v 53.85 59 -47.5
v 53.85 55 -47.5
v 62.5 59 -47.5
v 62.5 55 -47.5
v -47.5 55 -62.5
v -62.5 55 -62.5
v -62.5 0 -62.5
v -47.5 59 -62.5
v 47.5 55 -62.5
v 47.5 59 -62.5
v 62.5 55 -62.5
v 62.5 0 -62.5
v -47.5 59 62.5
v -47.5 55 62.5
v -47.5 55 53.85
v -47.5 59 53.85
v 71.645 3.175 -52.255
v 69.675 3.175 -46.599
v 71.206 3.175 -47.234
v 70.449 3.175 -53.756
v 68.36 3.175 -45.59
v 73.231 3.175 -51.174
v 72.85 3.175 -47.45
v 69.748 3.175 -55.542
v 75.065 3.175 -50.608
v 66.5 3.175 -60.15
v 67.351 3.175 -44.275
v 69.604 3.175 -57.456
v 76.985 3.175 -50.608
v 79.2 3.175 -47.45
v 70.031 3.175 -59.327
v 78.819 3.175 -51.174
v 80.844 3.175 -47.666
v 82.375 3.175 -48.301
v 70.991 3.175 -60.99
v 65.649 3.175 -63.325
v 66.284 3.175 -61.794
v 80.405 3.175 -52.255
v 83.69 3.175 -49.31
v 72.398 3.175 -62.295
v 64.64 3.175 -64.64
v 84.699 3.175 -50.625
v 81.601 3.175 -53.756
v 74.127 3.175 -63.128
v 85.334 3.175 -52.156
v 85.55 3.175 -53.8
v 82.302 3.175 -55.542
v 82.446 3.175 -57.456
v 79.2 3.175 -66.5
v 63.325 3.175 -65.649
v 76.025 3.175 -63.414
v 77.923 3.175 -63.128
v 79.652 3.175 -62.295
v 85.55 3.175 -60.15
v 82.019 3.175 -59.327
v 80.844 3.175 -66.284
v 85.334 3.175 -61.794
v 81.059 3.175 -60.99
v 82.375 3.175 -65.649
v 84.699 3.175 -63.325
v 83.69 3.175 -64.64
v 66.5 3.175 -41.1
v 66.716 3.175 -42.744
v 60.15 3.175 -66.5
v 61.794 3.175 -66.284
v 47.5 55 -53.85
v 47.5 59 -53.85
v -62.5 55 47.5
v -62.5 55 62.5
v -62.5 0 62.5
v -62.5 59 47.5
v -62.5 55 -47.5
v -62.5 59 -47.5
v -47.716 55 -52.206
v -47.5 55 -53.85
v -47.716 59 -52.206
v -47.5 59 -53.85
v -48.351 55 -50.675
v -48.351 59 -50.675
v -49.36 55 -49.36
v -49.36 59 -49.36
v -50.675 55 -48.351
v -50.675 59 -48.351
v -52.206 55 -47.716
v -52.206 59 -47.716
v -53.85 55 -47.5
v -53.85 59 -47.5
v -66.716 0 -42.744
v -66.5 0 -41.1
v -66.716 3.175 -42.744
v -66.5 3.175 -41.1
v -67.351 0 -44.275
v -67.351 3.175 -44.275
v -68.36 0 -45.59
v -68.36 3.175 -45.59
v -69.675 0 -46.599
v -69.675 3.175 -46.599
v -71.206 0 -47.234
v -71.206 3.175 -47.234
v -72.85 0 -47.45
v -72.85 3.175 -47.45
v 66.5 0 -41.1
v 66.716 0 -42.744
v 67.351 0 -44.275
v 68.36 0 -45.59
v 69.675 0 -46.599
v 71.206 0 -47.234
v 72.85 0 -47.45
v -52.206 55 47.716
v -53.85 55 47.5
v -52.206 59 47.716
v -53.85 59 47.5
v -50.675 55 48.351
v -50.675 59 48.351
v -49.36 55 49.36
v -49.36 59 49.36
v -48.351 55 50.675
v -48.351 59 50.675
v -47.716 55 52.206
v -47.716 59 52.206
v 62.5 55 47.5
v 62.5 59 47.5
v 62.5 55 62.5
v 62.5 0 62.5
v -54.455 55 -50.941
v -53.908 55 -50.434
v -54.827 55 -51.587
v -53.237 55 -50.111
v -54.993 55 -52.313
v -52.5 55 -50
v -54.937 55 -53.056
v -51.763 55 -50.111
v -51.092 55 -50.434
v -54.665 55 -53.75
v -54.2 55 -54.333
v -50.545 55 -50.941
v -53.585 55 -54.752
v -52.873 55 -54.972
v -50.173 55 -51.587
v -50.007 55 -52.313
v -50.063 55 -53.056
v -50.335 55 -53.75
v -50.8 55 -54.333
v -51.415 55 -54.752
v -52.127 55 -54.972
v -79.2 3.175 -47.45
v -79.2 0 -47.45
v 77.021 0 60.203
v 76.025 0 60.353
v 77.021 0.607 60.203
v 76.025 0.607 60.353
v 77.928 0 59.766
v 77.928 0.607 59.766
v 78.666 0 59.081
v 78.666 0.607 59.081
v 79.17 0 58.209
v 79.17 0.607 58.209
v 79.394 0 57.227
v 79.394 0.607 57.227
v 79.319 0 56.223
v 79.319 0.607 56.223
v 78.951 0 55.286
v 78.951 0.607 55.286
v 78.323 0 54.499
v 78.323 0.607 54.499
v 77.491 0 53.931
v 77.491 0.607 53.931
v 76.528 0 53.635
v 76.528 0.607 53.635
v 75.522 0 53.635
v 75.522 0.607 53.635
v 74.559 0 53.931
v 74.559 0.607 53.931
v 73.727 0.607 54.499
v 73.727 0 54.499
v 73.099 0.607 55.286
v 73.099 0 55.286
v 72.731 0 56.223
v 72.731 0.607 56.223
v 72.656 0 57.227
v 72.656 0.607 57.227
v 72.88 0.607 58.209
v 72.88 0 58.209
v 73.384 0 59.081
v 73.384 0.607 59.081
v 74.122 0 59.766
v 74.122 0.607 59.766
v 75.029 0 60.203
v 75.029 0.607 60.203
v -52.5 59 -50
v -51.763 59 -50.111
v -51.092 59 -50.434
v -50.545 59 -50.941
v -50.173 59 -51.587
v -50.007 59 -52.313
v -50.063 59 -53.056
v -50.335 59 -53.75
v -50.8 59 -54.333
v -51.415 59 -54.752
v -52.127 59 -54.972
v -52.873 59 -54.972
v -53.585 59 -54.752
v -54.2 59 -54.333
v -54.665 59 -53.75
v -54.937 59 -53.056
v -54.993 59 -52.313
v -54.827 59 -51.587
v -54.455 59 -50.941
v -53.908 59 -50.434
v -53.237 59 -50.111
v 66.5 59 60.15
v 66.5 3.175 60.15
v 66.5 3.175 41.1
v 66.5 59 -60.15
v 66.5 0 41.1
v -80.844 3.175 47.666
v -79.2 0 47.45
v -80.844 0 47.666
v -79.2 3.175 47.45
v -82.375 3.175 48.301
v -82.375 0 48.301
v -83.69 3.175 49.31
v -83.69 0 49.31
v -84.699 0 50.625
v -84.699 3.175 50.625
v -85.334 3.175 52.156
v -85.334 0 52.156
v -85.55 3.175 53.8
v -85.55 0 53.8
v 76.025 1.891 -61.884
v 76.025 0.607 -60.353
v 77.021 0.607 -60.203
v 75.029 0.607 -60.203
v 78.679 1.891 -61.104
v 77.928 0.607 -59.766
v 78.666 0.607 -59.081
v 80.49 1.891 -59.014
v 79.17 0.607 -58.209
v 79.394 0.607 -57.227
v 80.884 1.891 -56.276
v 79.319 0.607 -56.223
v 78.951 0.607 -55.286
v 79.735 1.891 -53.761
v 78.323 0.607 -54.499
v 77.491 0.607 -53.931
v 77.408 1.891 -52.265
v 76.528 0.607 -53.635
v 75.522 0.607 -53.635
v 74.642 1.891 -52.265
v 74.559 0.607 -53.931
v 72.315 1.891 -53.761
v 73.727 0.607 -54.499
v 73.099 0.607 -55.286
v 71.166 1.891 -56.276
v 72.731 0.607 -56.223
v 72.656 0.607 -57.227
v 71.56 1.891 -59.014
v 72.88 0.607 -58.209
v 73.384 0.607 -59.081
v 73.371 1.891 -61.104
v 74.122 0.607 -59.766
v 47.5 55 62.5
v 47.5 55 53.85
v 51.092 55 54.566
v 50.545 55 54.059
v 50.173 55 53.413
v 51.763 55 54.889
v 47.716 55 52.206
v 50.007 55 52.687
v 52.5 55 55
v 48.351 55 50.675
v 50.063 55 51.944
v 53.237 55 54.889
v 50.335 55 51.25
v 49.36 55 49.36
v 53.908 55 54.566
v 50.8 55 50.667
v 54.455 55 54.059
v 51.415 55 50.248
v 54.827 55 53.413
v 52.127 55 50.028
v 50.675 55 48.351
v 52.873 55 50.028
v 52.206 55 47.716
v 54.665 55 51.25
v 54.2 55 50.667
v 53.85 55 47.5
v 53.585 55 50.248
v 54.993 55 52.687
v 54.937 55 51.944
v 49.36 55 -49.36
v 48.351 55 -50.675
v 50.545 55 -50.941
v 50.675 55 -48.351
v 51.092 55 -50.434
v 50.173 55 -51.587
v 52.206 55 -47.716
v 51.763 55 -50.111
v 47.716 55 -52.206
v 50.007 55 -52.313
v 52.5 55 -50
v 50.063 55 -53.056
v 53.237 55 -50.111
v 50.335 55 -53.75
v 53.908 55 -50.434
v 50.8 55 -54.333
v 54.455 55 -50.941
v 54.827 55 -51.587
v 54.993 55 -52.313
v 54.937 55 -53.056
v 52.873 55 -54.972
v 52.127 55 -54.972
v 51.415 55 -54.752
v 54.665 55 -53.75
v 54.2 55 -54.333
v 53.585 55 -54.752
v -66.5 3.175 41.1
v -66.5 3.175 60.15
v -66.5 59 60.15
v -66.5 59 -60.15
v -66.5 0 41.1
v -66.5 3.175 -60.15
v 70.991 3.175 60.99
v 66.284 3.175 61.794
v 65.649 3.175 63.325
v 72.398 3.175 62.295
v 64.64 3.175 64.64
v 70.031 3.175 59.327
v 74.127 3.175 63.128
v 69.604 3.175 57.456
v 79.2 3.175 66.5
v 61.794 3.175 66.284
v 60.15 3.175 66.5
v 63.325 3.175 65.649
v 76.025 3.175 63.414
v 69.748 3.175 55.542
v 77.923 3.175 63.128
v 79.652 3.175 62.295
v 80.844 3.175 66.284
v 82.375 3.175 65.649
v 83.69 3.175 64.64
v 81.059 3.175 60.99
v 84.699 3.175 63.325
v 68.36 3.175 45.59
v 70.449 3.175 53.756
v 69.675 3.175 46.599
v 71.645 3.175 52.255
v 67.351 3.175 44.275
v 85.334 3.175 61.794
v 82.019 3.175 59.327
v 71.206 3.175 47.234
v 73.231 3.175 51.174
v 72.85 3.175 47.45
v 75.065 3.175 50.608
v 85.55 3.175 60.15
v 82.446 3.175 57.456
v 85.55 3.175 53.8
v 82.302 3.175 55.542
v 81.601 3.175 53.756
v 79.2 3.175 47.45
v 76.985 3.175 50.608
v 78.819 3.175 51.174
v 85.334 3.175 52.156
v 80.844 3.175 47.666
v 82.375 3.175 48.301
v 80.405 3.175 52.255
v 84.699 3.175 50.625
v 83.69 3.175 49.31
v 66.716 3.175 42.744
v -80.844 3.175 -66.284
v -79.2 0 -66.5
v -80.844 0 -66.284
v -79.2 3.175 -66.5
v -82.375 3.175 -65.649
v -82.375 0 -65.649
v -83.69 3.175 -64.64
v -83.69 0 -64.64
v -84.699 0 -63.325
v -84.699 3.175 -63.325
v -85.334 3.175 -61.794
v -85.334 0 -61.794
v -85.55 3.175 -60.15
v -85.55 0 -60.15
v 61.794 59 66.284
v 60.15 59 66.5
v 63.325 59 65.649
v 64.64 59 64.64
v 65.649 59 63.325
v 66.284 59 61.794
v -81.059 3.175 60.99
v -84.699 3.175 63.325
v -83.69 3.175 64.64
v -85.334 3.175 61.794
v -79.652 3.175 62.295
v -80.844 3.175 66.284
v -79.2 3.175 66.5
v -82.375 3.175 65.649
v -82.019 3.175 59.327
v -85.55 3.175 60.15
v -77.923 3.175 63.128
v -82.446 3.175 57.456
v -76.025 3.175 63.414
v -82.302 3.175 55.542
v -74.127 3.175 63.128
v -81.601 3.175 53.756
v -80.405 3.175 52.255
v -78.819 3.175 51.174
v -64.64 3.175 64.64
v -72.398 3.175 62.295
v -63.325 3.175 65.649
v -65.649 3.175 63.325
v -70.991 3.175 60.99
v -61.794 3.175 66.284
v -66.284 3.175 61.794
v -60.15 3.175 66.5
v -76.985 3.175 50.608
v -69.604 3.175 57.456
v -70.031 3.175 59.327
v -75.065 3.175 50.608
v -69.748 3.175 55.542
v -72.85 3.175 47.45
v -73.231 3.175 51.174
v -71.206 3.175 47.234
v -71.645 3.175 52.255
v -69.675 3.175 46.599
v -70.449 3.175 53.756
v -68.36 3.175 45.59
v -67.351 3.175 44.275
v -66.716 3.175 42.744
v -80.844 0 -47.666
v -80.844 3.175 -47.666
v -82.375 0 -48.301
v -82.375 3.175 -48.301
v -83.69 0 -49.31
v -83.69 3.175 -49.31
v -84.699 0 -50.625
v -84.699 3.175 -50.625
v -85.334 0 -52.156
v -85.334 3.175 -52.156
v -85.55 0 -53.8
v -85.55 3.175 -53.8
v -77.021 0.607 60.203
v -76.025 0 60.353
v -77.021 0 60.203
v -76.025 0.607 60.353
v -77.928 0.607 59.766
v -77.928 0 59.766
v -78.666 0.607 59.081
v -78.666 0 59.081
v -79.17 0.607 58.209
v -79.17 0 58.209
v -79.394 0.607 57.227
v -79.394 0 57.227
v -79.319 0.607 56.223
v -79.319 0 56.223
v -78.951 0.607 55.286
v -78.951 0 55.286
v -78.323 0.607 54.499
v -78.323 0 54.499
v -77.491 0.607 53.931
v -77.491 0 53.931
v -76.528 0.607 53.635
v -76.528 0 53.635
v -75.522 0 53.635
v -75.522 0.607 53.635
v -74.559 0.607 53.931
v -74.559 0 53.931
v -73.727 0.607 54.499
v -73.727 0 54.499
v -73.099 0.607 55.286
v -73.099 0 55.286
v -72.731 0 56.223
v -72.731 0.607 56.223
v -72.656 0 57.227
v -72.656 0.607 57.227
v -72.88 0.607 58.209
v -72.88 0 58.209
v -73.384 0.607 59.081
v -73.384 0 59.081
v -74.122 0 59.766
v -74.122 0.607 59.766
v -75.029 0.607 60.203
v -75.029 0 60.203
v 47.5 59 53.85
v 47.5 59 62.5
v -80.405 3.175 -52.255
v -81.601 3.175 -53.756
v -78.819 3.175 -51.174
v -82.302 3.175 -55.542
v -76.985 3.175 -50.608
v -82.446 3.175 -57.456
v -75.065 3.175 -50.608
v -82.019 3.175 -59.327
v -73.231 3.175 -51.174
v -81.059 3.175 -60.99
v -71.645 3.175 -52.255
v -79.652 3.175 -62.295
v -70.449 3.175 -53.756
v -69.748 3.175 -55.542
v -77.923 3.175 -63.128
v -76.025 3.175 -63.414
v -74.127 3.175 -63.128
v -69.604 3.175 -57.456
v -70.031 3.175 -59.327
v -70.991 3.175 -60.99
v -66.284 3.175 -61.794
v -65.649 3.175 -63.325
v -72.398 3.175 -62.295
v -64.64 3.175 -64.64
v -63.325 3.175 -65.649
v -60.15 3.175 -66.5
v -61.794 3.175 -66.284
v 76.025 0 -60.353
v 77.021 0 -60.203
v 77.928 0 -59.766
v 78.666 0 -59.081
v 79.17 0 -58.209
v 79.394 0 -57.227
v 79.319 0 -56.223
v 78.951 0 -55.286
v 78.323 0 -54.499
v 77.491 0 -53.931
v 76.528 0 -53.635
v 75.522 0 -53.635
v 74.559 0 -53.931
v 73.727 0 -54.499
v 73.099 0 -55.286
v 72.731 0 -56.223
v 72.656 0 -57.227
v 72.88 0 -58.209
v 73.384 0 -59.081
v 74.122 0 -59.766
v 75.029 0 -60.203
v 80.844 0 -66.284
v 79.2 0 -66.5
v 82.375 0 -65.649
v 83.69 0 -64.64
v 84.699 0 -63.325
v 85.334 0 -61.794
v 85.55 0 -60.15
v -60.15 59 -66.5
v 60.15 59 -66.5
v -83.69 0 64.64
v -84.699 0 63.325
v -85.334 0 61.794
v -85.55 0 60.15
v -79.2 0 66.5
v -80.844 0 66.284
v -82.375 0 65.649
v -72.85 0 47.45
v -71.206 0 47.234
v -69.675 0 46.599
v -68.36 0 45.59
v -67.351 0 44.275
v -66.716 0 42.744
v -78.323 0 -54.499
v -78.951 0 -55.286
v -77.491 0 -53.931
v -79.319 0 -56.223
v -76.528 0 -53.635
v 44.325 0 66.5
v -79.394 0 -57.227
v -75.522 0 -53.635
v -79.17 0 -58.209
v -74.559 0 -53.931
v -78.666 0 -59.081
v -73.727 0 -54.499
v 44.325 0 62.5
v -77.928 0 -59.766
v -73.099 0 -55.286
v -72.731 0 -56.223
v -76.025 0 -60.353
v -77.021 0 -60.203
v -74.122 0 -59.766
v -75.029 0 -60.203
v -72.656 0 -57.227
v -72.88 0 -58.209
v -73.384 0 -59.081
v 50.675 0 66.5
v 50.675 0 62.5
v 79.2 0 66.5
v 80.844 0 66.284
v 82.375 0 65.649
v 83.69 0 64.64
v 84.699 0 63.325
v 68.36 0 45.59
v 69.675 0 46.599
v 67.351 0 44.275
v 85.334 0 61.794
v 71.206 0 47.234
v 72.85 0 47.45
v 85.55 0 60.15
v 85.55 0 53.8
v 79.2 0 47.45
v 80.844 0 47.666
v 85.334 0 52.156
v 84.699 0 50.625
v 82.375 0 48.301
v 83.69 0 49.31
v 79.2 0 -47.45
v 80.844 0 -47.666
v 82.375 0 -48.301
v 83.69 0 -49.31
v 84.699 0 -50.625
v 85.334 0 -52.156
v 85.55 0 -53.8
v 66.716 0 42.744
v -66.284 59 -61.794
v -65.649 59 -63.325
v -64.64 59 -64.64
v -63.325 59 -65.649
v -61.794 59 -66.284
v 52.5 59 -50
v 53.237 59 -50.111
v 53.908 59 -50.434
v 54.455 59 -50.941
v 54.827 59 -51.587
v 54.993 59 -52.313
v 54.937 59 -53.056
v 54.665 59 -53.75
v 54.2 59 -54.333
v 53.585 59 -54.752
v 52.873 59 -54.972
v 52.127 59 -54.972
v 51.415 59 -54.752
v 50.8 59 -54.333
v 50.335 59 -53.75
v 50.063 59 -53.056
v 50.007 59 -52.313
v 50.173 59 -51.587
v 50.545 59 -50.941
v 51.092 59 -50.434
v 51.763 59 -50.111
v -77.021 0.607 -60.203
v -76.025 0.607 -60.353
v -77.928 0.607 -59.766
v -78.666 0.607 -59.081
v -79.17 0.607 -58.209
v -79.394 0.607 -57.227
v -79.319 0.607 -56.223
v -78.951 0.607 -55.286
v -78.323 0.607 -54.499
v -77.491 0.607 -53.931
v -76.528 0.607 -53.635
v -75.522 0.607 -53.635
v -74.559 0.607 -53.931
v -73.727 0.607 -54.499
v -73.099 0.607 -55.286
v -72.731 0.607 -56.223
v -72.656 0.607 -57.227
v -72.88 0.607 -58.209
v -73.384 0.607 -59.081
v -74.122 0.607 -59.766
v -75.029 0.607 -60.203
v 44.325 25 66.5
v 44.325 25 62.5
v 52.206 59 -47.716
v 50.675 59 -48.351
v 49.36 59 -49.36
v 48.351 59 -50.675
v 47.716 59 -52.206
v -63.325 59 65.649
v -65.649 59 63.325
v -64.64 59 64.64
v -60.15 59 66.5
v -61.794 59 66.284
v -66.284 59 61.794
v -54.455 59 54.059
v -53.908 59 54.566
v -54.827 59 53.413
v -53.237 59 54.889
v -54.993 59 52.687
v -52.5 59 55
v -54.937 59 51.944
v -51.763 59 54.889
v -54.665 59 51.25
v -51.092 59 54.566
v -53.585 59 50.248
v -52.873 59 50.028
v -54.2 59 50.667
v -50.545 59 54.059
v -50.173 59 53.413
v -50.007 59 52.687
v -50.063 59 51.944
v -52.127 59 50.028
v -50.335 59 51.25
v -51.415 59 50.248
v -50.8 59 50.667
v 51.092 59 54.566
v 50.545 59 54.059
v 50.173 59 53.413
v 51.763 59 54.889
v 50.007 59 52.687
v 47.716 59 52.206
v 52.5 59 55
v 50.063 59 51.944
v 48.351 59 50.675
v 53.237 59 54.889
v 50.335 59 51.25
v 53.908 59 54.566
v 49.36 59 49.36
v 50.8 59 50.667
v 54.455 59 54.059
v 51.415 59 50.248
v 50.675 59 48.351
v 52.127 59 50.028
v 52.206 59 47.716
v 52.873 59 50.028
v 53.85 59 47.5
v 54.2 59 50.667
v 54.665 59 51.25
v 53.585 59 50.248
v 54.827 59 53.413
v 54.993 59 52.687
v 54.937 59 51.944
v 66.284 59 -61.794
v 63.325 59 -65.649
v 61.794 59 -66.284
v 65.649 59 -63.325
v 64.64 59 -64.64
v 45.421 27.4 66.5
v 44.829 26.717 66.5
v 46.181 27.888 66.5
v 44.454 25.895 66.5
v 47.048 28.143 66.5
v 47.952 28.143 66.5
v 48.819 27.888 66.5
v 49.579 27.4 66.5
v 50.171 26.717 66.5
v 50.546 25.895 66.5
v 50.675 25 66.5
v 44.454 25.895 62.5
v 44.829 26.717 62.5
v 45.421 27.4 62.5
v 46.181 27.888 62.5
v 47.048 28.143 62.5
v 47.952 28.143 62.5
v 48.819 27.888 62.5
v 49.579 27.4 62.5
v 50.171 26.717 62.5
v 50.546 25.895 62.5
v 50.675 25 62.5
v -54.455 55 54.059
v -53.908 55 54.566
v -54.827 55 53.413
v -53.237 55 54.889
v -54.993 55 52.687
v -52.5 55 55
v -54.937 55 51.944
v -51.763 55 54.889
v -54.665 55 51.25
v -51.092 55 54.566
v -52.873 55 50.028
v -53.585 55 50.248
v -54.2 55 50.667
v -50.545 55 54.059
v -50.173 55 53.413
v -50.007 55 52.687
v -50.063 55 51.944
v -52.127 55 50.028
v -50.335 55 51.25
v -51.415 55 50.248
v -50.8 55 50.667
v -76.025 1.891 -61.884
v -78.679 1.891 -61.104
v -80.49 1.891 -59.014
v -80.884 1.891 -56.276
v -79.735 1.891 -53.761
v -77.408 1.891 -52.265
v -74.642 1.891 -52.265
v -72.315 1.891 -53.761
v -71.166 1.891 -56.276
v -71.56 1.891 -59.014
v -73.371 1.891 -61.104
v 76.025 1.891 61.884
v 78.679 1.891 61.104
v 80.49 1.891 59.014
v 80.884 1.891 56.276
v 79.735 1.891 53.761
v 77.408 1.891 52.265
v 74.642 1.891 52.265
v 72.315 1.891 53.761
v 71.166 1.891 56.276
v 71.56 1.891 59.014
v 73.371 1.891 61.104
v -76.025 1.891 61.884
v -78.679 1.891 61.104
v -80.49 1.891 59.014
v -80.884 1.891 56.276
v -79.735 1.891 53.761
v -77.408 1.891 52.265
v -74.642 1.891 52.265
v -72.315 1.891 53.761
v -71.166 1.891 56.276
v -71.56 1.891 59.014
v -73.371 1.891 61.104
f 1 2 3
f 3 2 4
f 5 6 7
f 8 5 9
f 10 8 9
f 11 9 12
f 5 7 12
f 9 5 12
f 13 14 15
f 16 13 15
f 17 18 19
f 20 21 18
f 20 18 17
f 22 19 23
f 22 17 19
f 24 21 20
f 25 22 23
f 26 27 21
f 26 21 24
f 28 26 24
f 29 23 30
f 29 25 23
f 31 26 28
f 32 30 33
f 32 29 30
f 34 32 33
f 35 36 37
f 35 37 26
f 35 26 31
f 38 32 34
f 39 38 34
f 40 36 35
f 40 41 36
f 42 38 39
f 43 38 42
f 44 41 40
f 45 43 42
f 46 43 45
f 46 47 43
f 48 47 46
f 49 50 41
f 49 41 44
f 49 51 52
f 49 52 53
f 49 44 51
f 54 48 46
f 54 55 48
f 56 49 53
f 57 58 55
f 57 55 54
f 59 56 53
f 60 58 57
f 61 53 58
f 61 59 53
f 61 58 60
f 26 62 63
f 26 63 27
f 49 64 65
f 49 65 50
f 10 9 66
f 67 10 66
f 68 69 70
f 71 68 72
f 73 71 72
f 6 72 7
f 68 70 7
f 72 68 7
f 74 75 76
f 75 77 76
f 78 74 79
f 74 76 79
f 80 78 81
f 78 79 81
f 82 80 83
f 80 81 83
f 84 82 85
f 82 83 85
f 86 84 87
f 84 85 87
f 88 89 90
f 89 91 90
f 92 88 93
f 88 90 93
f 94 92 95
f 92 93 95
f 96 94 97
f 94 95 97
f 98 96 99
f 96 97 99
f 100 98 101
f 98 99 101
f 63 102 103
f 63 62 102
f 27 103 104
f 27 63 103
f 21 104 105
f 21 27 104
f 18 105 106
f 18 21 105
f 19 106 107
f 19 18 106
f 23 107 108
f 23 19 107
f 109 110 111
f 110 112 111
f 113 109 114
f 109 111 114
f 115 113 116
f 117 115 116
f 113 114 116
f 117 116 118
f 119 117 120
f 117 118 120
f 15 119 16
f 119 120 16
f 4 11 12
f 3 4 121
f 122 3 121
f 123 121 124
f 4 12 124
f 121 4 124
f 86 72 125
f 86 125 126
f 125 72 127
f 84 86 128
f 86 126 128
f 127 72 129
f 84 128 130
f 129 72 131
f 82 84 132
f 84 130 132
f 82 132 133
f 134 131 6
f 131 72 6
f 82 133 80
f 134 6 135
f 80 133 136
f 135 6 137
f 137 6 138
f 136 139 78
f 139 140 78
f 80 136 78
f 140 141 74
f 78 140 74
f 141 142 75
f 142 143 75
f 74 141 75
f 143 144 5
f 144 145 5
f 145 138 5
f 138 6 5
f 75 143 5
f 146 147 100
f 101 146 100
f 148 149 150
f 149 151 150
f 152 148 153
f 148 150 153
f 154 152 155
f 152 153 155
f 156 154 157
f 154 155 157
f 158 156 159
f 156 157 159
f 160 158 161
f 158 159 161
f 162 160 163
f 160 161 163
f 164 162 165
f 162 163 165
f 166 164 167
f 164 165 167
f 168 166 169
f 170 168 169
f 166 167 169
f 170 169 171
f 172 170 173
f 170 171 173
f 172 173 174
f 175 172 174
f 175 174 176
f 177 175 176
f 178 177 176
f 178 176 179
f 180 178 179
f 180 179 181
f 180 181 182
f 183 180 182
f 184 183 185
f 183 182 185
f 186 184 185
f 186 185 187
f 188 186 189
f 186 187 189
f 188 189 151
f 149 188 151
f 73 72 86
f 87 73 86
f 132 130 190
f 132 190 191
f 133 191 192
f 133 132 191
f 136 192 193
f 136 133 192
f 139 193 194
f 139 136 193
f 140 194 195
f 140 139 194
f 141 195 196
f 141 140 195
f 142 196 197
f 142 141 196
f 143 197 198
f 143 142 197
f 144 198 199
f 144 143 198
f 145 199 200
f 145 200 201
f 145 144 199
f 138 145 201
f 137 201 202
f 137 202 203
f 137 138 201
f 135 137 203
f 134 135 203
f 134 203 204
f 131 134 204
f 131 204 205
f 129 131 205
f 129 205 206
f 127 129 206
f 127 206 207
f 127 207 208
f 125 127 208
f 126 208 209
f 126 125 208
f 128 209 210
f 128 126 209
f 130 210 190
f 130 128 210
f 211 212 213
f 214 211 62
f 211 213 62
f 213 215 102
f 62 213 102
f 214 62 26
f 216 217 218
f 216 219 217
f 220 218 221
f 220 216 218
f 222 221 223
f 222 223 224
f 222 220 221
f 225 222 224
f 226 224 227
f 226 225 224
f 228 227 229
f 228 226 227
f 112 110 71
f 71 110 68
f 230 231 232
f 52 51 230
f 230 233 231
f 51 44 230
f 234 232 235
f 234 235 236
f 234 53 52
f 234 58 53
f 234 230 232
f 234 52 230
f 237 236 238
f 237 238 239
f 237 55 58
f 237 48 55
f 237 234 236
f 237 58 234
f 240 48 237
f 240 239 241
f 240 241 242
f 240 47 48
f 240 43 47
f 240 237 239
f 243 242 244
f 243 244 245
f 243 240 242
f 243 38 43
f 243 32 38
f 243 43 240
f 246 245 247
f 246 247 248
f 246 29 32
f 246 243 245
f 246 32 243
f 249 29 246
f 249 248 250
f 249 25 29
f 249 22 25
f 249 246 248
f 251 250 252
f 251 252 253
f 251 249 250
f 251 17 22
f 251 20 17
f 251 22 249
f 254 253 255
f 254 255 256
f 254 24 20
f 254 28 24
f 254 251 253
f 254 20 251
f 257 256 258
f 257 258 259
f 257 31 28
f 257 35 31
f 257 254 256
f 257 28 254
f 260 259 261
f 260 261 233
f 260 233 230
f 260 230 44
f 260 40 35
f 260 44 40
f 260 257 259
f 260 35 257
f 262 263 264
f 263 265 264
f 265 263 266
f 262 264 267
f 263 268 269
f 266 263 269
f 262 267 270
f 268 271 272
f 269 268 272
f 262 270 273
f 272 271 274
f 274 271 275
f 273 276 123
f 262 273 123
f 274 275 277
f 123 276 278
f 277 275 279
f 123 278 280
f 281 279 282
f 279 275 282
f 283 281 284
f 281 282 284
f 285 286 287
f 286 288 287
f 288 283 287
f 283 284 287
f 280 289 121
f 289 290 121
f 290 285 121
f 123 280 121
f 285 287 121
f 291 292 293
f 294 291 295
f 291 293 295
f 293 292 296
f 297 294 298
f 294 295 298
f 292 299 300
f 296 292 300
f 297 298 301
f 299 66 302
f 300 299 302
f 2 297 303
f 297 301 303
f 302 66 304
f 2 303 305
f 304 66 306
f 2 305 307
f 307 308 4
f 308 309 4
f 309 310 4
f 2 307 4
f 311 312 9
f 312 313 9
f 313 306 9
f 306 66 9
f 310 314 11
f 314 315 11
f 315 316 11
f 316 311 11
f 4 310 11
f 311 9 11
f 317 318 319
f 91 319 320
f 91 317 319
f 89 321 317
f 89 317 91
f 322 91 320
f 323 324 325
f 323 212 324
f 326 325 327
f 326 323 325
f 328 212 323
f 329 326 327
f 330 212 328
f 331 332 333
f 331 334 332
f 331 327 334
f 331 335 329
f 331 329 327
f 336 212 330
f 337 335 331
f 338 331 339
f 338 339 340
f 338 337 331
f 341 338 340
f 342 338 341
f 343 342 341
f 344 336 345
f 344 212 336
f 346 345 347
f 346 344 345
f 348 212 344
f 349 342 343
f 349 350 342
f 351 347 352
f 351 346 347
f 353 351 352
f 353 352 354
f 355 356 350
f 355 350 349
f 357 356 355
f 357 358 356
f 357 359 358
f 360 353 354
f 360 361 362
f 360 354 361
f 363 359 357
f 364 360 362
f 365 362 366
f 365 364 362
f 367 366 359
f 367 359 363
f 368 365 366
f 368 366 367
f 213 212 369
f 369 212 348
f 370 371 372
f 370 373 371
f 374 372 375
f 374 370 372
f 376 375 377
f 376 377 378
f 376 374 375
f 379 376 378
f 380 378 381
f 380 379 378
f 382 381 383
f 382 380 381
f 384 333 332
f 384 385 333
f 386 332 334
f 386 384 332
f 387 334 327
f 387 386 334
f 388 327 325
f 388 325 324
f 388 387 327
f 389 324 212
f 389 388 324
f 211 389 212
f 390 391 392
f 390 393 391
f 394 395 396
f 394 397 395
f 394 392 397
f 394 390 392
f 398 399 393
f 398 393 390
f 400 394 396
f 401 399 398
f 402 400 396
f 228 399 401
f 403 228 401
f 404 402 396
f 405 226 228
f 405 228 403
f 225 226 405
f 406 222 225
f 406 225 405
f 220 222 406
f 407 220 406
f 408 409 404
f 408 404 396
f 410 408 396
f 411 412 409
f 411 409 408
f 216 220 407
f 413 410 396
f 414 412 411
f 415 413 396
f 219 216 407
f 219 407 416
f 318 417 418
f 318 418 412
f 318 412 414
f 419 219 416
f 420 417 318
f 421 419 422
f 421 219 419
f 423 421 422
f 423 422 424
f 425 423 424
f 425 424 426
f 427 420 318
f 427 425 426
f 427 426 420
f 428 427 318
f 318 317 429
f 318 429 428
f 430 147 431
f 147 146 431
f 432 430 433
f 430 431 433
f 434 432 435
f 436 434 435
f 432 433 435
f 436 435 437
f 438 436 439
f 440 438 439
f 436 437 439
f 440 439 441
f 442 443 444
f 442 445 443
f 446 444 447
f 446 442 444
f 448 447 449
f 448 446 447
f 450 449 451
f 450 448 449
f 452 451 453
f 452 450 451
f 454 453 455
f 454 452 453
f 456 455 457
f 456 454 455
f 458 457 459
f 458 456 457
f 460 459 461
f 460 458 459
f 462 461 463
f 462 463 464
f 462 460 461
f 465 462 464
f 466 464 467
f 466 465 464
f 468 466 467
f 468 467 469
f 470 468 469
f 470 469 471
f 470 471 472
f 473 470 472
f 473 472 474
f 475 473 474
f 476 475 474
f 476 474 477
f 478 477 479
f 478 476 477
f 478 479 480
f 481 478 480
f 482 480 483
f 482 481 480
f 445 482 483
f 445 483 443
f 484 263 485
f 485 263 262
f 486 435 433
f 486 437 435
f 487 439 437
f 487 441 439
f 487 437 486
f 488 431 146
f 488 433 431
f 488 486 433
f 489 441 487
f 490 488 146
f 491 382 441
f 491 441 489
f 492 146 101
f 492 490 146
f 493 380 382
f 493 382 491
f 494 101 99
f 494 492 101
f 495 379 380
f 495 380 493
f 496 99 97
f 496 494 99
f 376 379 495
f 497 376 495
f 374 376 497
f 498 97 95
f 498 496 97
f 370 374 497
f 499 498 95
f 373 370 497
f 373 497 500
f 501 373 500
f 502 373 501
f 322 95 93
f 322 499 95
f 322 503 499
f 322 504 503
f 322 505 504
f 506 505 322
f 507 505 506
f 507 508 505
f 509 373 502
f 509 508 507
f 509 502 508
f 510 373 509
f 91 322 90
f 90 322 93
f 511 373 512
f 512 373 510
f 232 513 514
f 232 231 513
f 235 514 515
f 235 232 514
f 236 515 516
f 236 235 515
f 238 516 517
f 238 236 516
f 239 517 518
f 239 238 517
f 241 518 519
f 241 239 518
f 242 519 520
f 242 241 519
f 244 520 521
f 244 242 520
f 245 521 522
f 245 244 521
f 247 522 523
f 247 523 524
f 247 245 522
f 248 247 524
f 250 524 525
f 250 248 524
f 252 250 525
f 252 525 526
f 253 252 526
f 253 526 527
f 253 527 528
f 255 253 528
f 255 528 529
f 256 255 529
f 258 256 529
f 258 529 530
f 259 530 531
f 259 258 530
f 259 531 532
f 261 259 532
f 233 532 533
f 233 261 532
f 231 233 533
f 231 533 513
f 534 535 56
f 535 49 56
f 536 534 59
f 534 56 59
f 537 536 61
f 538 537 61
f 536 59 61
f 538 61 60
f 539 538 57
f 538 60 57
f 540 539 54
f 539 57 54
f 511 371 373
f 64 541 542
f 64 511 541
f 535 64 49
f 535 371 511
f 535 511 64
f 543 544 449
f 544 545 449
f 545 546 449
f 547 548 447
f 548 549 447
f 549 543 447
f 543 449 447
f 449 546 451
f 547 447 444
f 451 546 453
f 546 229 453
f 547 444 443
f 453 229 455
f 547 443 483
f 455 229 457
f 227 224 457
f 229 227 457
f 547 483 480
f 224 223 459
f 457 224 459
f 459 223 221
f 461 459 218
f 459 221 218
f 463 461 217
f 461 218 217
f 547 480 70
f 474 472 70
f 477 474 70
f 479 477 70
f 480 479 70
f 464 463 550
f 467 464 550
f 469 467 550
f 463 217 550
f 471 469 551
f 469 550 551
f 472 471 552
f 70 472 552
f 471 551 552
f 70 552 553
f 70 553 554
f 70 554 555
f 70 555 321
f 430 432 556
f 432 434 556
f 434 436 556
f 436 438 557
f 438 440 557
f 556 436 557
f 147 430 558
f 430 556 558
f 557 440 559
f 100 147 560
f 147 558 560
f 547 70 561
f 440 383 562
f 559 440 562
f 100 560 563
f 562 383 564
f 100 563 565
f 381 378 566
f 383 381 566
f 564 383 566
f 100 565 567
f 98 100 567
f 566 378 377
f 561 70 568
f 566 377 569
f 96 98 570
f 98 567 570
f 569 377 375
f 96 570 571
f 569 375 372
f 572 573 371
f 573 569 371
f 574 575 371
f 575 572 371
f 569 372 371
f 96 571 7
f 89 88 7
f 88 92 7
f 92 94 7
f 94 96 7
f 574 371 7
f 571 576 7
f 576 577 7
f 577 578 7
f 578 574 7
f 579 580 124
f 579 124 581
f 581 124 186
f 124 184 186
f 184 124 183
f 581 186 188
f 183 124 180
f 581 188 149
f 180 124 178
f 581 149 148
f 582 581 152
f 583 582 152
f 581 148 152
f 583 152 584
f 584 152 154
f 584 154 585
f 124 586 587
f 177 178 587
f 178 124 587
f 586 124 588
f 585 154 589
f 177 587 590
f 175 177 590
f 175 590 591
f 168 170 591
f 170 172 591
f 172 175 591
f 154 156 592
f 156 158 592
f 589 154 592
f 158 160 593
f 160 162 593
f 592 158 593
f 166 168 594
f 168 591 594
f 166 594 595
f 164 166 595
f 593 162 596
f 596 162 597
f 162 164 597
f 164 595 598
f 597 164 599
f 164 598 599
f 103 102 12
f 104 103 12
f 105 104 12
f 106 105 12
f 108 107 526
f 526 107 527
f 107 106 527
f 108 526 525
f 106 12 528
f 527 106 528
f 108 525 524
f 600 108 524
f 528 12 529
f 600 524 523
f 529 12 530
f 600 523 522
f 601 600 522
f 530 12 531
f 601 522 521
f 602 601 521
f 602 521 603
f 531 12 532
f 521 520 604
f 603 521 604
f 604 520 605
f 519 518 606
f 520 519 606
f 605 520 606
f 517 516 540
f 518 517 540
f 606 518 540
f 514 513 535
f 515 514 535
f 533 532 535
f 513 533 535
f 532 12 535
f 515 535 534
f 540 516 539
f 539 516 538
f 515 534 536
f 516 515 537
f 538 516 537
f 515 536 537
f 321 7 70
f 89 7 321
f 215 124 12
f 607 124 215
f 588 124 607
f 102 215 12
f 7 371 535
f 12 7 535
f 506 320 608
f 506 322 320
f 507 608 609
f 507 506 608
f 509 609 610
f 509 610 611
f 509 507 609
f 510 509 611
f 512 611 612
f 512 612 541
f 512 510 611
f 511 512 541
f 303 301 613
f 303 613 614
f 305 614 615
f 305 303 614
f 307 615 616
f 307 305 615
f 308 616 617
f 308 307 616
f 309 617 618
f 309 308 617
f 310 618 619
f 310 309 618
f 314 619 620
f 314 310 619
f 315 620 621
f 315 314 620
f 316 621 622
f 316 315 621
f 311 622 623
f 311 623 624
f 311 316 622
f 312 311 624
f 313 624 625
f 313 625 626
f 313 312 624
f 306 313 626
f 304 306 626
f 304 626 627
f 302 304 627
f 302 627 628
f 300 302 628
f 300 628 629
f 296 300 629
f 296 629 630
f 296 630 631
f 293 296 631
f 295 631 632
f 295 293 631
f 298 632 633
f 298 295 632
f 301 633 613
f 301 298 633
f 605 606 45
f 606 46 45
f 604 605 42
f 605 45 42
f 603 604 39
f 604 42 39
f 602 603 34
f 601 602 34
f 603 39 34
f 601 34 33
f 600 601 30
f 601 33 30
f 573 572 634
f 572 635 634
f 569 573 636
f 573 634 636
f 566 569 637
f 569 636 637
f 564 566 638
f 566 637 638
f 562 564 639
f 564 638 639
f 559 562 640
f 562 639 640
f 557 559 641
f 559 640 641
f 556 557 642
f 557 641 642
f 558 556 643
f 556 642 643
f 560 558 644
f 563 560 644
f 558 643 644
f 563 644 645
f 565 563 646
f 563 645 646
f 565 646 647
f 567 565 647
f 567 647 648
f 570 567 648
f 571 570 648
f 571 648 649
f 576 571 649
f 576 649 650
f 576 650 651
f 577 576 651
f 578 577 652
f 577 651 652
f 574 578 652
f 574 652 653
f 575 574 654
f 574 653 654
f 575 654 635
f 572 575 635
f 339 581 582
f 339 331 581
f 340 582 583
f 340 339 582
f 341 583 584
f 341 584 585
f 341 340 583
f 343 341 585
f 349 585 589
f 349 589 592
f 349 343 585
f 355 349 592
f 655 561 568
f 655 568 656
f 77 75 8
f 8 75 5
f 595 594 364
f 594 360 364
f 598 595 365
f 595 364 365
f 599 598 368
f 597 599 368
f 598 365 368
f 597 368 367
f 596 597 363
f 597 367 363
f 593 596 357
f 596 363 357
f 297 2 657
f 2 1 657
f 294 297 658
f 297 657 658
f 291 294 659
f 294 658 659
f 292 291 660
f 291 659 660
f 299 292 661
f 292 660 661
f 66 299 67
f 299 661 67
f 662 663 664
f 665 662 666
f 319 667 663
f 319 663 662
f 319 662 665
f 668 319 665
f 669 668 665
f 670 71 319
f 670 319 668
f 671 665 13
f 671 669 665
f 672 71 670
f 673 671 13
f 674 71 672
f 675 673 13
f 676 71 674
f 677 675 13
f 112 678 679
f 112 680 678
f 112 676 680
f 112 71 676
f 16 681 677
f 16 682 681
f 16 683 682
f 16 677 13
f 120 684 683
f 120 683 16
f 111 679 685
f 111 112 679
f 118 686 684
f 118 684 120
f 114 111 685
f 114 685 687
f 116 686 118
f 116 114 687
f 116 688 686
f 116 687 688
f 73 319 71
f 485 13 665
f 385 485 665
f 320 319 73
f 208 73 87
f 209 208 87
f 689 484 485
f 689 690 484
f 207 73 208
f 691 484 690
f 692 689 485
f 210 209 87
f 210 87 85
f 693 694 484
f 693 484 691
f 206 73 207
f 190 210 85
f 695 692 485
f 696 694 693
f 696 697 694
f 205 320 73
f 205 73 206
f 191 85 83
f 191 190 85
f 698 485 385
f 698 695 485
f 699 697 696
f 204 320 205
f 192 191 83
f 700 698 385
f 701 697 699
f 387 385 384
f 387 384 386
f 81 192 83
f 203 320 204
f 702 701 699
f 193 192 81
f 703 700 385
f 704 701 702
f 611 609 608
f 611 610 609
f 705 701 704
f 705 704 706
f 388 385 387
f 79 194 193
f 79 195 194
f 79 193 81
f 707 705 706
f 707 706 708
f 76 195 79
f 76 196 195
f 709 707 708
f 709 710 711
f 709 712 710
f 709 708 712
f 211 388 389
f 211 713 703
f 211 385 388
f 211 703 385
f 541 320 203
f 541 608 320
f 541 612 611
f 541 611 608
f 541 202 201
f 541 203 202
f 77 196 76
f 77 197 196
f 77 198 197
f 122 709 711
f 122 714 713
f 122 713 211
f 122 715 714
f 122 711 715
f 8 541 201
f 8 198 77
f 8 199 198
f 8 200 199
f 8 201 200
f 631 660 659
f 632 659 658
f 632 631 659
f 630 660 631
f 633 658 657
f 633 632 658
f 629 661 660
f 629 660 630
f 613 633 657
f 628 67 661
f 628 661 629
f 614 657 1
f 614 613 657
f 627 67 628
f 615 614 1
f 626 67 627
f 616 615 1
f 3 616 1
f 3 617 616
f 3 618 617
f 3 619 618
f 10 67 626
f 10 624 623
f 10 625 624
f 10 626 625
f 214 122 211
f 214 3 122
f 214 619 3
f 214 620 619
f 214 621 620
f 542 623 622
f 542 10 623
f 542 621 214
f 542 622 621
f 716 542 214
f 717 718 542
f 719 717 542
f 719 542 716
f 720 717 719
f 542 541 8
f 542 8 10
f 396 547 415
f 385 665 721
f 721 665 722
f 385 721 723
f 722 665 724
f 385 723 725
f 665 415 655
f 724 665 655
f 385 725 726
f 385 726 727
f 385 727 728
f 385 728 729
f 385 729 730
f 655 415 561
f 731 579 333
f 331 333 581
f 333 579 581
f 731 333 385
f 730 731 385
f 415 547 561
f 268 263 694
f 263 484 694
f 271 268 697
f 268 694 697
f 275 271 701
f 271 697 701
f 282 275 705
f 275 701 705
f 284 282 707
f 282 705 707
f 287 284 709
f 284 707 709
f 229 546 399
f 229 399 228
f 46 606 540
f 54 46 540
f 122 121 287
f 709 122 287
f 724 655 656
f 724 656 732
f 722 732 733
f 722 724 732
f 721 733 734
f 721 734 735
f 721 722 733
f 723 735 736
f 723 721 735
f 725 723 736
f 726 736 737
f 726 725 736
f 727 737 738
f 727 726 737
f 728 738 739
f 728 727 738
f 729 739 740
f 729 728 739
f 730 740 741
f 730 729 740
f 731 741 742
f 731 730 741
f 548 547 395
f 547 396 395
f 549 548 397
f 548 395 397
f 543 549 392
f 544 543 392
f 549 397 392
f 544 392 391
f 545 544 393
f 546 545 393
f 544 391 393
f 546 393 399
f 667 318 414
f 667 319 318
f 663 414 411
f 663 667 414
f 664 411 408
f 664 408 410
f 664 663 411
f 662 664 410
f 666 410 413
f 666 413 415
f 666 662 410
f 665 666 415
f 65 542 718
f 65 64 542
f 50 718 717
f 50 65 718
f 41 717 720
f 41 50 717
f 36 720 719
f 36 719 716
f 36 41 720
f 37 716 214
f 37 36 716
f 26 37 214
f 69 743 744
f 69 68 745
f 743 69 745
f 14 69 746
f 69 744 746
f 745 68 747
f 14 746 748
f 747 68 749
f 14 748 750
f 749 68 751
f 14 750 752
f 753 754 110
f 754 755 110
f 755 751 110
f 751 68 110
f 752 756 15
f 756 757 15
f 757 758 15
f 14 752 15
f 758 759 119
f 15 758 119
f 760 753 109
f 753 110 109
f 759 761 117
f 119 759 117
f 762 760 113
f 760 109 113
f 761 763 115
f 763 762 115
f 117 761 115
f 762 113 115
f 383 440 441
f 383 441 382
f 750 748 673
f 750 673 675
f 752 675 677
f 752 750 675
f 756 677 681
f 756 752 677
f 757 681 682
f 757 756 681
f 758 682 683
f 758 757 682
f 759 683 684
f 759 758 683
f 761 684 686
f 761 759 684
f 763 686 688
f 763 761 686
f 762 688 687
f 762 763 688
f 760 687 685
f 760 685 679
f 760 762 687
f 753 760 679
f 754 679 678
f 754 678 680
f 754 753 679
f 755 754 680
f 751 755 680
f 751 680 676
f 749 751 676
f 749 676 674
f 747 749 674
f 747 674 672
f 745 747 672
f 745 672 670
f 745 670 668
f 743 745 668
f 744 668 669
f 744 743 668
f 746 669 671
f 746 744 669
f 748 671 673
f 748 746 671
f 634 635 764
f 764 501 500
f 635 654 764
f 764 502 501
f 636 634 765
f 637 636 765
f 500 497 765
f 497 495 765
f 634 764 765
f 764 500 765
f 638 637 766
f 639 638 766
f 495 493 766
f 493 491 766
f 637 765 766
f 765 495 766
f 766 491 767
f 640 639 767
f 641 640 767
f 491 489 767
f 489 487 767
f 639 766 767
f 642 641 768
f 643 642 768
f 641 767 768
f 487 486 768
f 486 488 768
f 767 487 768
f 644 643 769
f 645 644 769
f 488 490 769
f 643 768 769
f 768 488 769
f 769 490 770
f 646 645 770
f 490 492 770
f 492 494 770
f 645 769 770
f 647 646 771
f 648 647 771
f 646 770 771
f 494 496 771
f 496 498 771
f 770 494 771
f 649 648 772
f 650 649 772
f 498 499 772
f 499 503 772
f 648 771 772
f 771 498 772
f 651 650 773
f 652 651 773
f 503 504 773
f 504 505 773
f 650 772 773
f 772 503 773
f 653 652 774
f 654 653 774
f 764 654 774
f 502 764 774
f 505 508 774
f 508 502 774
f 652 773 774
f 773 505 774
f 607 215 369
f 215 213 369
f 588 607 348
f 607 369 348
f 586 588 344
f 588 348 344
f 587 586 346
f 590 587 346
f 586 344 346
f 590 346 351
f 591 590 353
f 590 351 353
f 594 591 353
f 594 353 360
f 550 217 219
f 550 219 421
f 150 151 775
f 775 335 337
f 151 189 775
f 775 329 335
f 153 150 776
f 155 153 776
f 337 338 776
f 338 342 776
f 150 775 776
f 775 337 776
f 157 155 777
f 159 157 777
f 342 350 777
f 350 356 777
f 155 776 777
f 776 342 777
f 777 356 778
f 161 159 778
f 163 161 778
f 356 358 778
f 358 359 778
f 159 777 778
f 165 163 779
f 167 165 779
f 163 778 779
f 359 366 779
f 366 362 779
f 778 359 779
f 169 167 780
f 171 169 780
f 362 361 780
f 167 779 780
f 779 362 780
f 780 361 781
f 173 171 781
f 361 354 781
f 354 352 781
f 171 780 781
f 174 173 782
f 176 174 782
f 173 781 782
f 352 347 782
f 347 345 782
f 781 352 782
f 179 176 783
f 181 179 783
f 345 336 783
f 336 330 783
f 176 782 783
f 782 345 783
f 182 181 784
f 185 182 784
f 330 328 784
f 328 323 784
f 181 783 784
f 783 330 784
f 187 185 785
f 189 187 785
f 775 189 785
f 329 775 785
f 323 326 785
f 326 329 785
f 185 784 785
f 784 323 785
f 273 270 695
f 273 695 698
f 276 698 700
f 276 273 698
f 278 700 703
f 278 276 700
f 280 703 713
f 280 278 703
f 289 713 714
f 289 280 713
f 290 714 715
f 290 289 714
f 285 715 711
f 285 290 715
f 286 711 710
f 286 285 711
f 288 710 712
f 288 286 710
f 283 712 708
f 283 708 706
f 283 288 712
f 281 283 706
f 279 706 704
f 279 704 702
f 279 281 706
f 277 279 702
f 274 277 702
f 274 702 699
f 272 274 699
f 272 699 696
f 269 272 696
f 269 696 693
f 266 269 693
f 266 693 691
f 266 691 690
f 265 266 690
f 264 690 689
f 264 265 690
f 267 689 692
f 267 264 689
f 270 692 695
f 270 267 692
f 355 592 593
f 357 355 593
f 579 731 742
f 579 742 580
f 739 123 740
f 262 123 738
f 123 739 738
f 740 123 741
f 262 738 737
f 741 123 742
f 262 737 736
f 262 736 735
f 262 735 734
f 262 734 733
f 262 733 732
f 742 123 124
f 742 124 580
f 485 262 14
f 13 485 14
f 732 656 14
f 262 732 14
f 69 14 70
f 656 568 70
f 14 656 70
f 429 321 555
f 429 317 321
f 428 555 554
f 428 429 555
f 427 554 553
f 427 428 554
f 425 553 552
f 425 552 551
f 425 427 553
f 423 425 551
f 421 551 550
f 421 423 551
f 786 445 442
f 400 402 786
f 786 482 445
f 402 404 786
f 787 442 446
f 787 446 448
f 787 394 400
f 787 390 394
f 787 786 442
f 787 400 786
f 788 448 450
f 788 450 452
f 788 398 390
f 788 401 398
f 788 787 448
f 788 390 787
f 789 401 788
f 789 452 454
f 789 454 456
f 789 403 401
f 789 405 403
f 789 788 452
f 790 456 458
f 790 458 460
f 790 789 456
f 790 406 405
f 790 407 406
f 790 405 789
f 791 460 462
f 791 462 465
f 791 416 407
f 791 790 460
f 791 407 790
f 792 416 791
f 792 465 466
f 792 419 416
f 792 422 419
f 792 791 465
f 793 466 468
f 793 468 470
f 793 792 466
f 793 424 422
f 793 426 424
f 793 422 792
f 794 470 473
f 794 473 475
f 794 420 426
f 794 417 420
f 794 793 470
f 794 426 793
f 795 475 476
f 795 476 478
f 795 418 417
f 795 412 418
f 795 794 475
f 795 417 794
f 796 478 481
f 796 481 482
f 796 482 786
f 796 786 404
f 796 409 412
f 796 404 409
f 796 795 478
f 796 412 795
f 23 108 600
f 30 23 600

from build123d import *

# Parameters (mm, degrees)
SKETCH1_W           = 133
SKETCH1_H           = 133
SKETCH1_W_2         = 125
SKETCH1_H_2         = 125
BOSS_EXTRUDE1_DEPTH = 55
SKETCH1_3_W         = 19.05
SKETCH1_3_H         = 19.05
BOSS_EXTRUDE2_DEPTH = 3.175
SKETCH2_W           = 133
SKETCH2_H           = 133
SKETCH2_R           = 2.5
BOSS_EXTRUDE3_DEPTH = 4
FILLET1_R           = 6.35
CUT_EXTRUDE1_DEPTH  = 4


with BuildPart() as part:
    # Sketch1 → Boss-Extrude1 (new body)
    with BuildSketch(Plane(origin=(0, 0, 0), x_dir=(1, 0, 0), z_dir=(0, 1, 0))):
        Rectangle(SKETCH1_W, SKETCH1_H)
        Rectangle(SKETCH1_W_2, SKETCH1_H_2, mode=Mode.SUBTRACT)
    extrude(amount=BOSS_EXTRUDE1_DEPTH)

    # Sketch1<3> → Boss-Extrude2 (add)
    with BuildSketch(Plane(origin=(0, 0, 0), x_dir=(1, 0, 0), z_dir=(0, 1, 0))):
        with Locations((-76.025, 56.975)):
            Rectangle(SKETCH1_3_W, SKETCH1_3_H)
        with Locations((-76.025, -56.975)):
            Rectangle(SKETCH1_3_W, SKETCH1_3_H)
        with Locations((76.025, -56.975)):
            Rectangle(SKETCH1_3_W, SKETCH1_3_H)
        with Locations((76.025, 56.975)):
            Rectangle(SKETCH1_3_W, SKETCH1_3_H)
    extrude(amount=BOSS_EXTRUDE2_DEPTH)

    # Sketch2 → Boss-Extrude3 (add)
    with BuildSketch(Plane(origin=(0, 55, 0), x_dir=(1, 0, 0), z_dir=(0, 1, 0))):
        Rectangle(SKETCH2_W, SKETCH2_H)
        with Locations(Location((-52.5, 52.5, 0), (0, 0, 270))):
            Circle(SKETCH2_R, mode=Mode.SUBTRACT)
        with Locations(Location((52.5, 52.5, 0), (0, 0, 270))):
            Circle(SKETCH2_R, mode=Mode.SUBTRACT)
        with Locations(Location((52.5, -52.5, 0), (0, 0, 270))):
            Circle(SKETCH2_R, mode=Mode.SUBTRACT)
        with Locations(Location((-52.5, -52.5, 0), (0, 0, 270))):
            Circle(SKETCH2_R, mode=Mode.SUBTRACT)
        Polygon((-62.5, 47.5), (-47.5, 47.5), (-47.5, 62.5), (47.5, 62.5), (47.5, 47.5), (62.5, 47.5), (62.5, -47.5), (47.5, -47.5), (47.5, -62.5), (-47.5, -62.5), (-47.5, -47.5), (-62.5, -47.5), align=None, mode=Mode.SUBTRACT)
    extrude(amount=BOSS_EXTRUDE3_DEPTH)

    # Sketch5 → CSK for 1/4 Flat Head Machine Screw (100)1 (revolve, cut)
    with BuildSketch(Plane(origin=(-76.025, 3.175, 56.975), x_dir=(0, 0, 1), z_dir=(1, 0, 0))):
        Polygon((0, 0), (0, 3.175), (3.3782, 3.175), (3.3782, 2.568232241), (6.4389, 0), align=None)
    csk_for_1_4_flat_head_machine_screw_100 = revolve(axis=Axis((-76.025, 9.525, 56.975), (0, -1, 0)), mode=Mode.SUBTRACT)

    # Mirror1: CSK for 1/4 Flat Head Machine Screw (100)1 across plane
    add(csk_for_1_4_flat_head_machine_screw_100.mirror(Plane.XY), mode=Mode.SUBTRACT)

    # Mirror1 at the second plane: CSK for 1/4 Flat Head Machine Screw (100)1 across plane
    add(csk_for_1_4_flat_head_machine_screw_100.mirror(Plane(origin=(0, 0, 0), x_dir=(0, 0, 1), z_dir=(1, 0, 0))), mode=Mode.SUBTRACT)

    # Mirror1 at the second plane copy 1 sketc → Mirror1 at the second plane copy 1 (revolve, cut)
    with BuildSketch(Plane(origin=(76.025, 3.175, -56.975), x_dir=(0, 0, -1), z_dir=(-1, 0, 0))):
        Polygon((0, 0), (0, 3.175), (3.3782, 3.175), (3.3782, 2.568232241), (6.4389, 0), align=None)
    revolve(axis=Axis((76.025, 9.525, -56.975), (0, -1, 0)), mode=Mode.SUBTRACT)

    # Fillet1
    fillet1_edges = [part.edges().sort_by_distance(p)[0] for p in [
        (-66.5, 31.0875, 66.5),
        (-66.5, 31.0875, -66.5),
        (66.5, 31.0875, -66.5),
        (66.5, 31.0875, 66.5),
        (-85.55, 1.5875, -66.5),
        (-85.55, 1.5875, -47.45),
        (-66.5, 1.5875, -47.45),
        (-85.55, 1.5875, 66.5),
        (-66.5, 1.5875, 47.45),
        (-85.55, 1.5875, 47.45),
        (85.55, 1.5875, 47.45),
        (66.5, 1.5875, 47.45),
        (85.55, 1.5875, 66.5),
        (85.55, 1.5875, -66.5),
        (66.5, 1.5875, -47.45),
        (85.55, 1.5875, -47.45),
        (-47.5, 57, -47.5),
        (-47.5, 57, 47.5),
        (47.5, 57, 47.5),
        (47.5, 57, -47.5),
    ]]
    fillet(fillet1_edges, radius=FILLET1_R)

    # Sketch6 → Cut-Extrude1 (cut)
    with BuildSketch(Plane.XY.offset(66.5)):
        with BuildLine():
            Line((44.325, 0), (44.325, 25))
            ThreePointArc((44.325, 25), (47.5, 28.175), (50.675, 25))
            Line((50.675, 25), (50.675, 0))
            ThreePointArc((50.675, 0), (47.5, -3.175), (44.325, 0))
        make_face()
    extrude(amount=-CUT_EXTRUDE1_DEPTH, mode=Mode.SUBTRACT)


solid = part.part
